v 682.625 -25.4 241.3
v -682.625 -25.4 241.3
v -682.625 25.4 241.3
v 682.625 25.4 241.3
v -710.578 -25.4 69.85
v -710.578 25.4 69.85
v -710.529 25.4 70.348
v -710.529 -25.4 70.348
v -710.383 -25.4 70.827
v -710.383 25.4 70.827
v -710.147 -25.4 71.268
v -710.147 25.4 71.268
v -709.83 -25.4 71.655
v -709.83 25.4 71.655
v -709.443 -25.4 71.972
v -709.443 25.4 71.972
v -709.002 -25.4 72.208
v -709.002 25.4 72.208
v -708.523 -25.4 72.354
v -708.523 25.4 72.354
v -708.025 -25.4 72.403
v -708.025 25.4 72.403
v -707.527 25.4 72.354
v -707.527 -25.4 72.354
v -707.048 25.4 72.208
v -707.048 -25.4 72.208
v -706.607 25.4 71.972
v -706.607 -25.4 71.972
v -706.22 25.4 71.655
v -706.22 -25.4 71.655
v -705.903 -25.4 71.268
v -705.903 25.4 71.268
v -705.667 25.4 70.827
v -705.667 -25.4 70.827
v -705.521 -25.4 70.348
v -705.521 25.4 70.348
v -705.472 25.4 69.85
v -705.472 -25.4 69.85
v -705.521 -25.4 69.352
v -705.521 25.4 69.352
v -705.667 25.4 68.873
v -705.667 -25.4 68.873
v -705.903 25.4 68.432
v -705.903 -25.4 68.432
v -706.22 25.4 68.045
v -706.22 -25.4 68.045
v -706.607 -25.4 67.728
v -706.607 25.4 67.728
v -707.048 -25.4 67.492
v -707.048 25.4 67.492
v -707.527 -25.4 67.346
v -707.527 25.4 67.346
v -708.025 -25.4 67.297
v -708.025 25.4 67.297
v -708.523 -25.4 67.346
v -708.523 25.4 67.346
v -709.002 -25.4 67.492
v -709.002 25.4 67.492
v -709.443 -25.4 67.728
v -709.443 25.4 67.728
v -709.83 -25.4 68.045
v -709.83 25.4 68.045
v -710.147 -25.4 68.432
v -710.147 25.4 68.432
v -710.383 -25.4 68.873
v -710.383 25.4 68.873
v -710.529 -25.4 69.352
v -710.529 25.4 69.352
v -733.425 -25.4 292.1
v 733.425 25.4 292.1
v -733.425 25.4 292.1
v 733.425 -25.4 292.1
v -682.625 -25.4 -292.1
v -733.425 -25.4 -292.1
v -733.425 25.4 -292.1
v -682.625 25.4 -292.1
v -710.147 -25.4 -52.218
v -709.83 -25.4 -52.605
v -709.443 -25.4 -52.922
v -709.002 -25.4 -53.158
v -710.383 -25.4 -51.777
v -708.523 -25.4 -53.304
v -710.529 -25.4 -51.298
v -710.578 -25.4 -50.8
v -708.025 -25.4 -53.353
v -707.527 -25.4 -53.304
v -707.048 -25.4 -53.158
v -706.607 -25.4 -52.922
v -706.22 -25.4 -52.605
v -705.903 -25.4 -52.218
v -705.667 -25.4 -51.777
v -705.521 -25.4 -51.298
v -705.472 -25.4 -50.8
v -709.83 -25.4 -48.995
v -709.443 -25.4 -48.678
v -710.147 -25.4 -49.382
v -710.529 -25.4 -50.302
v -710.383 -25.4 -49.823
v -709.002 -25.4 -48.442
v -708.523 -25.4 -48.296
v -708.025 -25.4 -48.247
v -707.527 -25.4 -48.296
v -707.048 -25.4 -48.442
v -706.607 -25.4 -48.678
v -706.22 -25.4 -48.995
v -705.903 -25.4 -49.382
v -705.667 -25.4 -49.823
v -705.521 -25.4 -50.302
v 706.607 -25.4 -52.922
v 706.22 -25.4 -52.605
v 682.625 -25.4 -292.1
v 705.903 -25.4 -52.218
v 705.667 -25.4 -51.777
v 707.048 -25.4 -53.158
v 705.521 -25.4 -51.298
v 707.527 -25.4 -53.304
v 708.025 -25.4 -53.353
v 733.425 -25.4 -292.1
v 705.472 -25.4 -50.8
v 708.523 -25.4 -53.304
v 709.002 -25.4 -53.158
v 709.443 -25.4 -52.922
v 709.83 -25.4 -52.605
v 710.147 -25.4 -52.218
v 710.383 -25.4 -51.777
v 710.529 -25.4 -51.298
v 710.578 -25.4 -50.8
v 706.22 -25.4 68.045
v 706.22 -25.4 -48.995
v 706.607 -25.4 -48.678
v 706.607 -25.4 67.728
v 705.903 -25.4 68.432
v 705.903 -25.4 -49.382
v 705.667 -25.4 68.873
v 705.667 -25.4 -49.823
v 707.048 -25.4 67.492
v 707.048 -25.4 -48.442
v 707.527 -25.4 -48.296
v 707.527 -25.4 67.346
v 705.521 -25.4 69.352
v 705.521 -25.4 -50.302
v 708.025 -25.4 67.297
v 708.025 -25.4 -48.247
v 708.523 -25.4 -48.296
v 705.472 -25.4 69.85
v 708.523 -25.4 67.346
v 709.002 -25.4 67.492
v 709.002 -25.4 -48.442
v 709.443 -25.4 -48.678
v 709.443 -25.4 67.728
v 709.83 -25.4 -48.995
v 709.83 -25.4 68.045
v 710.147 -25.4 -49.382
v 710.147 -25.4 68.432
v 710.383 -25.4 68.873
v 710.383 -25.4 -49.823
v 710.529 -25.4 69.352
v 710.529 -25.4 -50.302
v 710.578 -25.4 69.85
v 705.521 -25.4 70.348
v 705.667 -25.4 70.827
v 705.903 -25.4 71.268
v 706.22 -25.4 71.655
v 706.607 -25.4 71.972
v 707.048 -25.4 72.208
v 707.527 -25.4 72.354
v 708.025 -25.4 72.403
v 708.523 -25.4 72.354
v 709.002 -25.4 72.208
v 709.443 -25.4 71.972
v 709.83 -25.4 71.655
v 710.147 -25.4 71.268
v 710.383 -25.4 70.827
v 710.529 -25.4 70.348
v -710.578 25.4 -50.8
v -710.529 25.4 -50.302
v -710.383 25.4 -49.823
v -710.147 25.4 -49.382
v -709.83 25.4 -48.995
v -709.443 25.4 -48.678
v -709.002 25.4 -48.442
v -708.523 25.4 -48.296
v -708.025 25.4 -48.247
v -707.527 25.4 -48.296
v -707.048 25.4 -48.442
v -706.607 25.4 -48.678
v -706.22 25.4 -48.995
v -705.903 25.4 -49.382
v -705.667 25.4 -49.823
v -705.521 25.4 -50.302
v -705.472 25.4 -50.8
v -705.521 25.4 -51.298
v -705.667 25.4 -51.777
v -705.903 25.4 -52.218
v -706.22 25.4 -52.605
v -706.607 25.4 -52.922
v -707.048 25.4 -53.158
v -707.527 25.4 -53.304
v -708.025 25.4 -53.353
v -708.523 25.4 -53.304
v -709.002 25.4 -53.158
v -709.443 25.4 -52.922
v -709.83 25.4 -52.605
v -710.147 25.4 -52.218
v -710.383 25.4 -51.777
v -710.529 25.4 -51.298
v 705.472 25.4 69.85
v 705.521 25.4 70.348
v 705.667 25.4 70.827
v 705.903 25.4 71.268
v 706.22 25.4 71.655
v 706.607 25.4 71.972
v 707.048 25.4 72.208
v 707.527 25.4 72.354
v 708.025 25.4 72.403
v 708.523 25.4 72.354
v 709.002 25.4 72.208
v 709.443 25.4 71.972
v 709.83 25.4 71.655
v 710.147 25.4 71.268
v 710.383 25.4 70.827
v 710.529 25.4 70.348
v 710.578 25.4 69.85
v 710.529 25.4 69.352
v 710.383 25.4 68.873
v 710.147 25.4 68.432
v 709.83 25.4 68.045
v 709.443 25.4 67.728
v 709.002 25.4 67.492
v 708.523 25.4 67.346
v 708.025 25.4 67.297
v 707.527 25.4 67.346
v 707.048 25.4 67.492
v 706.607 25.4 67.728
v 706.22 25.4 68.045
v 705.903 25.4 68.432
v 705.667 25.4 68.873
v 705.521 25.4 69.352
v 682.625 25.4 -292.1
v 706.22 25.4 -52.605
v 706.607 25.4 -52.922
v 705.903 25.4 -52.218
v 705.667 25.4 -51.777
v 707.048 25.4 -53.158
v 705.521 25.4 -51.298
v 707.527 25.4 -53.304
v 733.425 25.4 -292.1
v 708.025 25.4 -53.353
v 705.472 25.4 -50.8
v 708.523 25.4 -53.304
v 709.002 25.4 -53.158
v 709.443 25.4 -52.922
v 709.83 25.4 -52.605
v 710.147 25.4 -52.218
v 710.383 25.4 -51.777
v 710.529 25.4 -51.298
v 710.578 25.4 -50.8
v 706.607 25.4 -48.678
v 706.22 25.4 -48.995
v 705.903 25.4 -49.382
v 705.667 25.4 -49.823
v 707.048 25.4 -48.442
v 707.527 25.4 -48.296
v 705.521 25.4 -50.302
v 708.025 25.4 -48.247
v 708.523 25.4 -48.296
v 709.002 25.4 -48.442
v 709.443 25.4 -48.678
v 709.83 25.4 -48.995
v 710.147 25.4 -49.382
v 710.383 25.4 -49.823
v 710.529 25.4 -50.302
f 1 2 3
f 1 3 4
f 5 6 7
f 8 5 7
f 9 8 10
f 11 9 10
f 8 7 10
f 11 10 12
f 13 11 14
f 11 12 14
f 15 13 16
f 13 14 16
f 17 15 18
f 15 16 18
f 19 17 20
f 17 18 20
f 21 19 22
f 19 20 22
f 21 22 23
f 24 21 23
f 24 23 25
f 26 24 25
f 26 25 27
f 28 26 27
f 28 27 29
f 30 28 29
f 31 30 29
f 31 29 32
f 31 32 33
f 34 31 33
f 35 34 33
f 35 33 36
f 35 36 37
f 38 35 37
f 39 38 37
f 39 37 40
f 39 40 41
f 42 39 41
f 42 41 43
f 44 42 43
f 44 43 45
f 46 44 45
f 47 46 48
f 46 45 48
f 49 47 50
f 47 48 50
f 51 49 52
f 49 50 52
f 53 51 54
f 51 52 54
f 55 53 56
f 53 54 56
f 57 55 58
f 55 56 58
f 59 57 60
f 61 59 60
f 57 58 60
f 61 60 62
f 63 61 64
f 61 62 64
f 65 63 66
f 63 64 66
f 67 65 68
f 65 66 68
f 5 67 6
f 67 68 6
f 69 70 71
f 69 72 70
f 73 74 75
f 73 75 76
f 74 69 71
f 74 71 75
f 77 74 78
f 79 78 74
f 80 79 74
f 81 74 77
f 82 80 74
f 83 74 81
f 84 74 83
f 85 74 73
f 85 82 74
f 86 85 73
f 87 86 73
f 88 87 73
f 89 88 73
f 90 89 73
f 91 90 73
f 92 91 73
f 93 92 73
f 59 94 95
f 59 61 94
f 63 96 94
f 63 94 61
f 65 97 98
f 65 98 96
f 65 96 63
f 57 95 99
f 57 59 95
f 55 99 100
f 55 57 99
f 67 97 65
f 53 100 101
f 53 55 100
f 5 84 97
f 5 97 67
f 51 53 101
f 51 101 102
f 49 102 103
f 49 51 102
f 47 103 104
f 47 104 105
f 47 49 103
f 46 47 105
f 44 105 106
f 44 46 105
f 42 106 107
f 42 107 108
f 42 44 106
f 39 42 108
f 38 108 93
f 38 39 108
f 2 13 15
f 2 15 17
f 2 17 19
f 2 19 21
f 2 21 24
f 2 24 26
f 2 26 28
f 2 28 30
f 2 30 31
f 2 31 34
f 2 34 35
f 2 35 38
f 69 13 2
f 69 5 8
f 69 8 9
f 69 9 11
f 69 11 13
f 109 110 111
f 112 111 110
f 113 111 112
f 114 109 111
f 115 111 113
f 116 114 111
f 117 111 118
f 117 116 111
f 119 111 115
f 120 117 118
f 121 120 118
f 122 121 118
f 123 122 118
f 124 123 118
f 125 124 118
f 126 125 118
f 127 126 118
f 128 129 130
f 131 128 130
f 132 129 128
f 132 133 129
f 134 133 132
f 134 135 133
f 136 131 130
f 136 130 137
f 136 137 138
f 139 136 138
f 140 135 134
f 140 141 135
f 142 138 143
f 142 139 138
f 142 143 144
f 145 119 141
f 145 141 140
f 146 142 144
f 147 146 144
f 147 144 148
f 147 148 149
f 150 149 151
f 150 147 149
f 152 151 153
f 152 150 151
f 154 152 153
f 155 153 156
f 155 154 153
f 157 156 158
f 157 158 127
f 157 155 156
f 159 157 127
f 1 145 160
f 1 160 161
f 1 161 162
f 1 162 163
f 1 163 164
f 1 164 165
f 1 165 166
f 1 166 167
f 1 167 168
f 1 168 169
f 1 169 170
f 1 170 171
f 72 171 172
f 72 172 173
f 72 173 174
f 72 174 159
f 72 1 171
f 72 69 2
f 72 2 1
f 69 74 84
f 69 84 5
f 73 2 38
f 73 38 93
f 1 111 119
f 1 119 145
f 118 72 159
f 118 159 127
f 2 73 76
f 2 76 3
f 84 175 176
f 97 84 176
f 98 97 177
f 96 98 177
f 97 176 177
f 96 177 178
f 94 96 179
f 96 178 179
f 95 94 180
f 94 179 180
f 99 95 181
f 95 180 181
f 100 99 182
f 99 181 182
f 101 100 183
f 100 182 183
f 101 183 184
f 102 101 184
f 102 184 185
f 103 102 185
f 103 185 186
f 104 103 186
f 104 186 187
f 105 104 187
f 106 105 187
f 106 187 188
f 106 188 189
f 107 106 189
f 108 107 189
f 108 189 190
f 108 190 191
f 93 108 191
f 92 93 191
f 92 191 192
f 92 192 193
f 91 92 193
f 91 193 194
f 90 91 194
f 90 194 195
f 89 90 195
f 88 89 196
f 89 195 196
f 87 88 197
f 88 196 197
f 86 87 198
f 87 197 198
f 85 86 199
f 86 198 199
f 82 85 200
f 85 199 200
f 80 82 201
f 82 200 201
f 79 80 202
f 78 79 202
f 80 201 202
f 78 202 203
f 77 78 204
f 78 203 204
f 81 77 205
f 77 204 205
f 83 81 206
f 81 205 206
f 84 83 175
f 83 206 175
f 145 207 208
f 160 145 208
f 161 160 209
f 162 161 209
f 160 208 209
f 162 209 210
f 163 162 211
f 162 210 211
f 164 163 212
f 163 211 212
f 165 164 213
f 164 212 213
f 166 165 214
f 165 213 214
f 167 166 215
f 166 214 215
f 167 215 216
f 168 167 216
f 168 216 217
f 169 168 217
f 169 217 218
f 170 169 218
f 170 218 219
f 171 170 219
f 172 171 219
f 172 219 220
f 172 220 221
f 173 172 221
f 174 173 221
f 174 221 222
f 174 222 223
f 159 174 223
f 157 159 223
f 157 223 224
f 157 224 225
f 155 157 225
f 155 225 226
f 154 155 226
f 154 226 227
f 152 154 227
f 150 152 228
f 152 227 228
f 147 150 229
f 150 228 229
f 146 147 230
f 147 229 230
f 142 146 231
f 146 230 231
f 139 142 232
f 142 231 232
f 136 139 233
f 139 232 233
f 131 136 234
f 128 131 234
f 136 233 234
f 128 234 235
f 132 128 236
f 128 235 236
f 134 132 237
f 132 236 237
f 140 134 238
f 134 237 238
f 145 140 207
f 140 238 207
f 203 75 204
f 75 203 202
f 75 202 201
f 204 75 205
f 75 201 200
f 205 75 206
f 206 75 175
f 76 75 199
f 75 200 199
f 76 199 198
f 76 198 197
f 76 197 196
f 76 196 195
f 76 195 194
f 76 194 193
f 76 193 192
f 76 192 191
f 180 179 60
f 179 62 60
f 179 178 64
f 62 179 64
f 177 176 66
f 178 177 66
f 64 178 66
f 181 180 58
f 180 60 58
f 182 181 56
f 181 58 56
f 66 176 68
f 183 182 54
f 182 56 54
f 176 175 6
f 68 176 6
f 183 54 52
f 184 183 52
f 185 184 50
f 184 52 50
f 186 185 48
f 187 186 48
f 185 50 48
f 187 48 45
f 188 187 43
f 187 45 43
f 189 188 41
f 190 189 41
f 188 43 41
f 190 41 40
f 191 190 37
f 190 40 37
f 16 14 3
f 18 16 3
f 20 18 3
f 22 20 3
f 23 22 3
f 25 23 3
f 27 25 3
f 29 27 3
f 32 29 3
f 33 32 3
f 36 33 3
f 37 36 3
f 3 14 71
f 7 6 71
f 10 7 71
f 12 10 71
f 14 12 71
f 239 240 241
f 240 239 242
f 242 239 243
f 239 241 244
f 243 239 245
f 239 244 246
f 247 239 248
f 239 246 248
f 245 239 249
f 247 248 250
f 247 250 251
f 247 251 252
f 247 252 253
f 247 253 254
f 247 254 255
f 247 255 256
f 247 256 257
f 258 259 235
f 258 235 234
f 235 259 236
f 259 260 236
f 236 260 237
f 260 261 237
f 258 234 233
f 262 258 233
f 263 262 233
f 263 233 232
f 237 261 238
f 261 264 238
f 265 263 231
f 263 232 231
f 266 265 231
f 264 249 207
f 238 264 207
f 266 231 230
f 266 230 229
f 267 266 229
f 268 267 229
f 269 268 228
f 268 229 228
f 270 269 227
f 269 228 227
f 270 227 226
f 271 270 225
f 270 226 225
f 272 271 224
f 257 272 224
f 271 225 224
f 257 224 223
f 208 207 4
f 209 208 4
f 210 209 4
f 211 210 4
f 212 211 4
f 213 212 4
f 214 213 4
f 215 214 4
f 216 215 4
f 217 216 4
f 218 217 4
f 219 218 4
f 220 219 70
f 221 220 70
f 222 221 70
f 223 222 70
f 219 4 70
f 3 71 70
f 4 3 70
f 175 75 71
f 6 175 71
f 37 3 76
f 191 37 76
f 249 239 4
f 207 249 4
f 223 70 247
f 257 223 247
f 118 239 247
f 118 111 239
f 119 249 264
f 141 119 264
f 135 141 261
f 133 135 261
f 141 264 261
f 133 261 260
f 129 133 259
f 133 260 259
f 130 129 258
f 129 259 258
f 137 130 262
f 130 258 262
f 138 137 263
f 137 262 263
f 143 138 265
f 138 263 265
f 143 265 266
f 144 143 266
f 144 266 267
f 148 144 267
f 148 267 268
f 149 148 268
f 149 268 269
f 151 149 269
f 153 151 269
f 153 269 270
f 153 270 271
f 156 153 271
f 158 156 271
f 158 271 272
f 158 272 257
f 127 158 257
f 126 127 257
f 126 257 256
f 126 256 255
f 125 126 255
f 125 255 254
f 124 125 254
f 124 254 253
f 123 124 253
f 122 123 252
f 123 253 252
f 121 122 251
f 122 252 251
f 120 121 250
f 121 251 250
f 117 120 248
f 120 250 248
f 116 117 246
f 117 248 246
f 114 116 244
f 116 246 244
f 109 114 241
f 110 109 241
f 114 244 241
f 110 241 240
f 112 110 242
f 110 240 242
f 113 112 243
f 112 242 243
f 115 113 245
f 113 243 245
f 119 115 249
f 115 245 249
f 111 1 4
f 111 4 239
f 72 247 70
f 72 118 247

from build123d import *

# Parameters (mm, degrees)
F1_DEPTH      = 25.4
F1_DEPTH_BACK = 25.4
F3_D          = 5.1054


with BuildPart() as f1:
    # F0 (on Front) → F1 (new body, two sides)
    with BuildSketch(Plane.XZ) as f1_sk:
        Polygon((733.425, 292.1), (-733.425, 292.1), (-733.425, -292.1), (-682.625, -292.1), (-682.625, 241.3), (682.625, 241.3), (682.625, -292.1), (733.425, -292.1), align=None)
    extrude(amount=F1_DEPTH)
    extrude(f1_sk.sketch, amount=-F1_DEPTH_BACK)

    # F3 (through all)
    with Locations(Plane.XZ.offset(25.4)):
        with Locations((-708.025, -50.8), (708.025, -50.8), (708.025, 69.85), (-708.025, 69.85)):
            Hole(F3_D / 2)


solid = f1.part
